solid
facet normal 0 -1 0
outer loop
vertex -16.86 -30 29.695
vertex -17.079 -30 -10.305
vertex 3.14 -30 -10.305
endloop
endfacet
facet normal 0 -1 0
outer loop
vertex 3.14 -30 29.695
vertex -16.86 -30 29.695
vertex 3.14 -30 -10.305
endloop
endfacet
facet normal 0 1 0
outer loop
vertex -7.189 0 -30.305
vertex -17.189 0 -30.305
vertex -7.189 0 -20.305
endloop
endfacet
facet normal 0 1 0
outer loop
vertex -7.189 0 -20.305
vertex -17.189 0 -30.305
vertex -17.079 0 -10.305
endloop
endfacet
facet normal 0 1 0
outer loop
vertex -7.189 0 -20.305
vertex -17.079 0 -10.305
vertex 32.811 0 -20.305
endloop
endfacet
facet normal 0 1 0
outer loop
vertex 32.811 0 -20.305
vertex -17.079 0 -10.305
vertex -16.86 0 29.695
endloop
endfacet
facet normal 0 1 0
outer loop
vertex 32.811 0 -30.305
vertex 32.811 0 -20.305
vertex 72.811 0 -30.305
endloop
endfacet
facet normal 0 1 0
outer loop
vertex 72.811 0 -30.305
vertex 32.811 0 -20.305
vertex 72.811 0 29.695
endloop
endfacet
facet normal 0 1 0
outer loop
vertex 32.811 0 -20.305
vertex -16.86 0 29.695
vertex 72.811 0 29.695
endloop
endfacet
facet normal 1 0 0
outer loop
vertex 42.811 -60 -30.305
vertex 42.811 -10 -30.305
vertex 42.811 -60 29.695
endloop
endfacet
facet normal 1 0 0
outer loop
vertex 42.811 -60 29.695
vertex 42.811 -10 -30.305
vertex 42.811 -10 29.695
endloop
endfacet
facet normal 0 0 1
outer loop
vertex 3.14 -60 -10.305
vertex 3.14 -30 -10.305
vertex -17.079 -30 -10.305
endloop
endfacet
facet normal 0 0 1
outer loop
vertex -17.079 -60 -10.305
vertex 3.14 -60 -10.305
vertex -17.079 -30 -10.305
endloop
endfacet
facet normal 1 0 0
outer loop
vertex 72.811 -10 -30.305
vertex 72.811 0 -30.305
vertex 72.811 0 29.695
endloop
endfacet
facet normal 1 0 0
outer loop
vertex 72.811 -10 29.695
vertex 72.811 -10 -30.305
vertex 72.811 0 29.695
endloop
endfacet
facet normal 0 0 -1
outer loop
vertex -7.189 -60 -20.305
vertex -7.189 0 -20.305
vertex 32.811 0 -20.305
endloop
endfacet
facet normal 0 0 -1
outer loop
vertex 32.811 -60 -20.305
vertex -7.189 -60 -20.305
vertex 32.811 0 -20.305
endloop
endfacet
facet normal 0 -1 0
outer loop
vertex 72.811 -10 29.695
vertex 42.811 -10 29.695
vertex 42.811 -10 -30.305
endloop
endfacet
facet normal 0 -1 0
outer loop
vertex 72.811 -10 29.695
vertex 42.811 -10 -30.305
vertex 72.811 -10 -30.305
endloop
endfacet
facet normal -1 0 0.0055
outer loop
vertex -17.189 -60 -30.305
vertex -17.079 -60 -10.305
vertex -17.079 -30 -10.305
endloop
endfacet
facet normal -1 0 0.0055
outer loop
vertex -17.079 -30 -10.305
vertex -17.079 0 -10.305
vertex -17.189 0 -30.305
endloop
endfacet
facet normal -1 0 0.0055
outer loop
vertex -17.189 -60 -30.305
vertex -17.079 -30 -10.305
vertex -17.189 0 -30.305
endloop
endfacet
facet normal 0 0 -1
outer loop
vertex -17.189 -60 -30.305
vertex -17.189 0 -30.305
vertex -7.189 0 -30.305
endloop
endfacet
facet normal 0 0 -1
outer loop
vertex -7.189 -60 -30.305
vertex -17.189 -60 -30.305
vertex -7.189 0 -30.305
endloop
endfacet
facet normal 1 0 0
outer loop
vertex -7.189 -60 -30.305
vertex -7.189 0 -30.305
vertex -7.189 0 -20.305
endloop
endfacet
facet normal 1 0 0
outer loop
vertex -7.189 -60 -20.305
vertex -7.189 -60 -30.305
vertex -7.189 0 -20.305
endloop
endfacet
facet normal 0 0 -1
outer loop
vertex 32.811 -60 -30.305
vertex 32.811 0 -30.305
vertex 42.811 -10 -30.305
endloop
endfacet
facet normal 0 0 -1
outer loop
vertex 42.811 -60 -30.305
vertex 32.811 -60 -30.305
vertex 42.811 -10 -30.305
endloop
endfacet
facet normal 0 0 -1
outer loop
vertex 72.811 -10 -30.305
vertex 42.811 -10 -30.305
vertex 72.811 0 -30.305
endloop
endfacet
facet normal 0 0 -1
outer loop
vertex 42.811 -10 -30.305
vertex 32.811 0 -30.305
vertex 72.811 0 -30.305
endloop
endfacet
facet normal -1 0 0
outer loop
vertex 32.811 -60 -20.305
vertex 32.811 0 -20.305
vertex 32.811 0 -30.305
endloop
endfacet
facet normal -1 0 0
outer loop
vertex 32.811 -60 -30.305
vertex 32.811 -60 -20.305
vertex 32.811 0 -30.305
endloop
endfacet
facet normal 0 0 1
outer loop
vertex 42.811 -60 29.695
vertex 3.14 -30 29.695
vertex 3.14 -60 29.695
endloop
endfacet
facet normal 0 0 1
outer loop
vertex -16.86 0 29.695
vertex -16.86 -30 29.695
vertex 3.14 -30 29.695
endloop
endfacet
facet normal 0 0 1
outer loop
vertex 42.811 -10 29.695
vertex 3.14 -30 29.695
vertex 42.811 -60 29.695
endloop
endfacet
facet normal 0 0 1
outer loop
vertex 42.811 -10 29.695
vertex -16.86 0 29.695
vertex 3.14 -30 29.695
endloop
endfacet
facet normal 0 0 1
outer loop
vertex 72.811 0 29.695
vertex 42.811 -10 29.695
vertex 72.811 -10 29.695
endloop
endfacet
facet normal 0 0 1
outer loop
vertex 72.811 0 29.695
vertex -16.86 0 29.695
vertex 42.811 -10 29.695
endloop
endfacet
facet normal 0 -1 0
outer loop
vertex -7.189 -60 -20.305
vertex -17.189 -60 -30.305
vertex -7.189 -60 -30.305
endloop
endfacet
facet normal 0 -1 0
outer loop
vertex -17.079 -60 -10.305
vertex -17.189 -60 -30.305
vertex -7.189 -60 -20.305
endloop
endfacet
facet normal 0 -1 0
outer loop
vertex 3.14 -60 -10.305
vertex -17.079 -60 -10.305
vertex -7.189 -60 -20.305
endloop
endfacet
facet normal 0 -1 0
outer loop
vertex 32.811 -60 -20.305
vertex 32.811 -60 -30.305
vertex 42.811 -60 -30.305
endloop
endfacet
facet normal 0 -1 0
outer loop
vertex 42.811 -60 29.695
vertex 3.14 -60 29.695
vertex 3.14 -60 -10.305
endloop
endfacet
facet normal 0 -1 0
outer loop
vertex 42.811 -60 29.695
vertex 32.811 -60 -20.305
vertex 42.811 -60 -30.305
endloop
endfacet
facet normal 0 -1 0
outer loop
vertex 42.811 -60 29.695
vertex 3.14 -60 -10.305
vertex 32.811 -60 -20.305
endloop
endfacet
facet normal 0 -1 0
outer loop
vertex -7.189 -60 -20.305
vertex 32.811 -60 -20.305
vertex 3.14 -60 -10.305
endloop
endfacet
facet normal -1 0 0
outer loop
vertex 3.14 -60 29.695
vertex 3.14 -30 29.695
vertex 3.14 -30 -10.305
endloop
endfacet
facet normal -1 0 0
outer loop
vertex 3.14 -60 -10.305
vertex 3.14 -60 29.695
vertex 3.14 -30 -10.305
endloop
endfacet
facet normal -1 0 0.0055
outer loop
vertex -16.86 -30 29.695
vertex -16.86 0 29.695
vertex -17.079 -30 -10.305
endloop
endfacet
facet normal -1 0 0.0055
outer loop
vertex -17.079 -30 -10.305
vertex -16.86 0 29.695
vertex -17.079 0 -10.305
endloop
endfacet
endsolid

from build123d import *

# Parameters (mm, degrees)
F1_DEPTH = 60
F2_DEPTH = 30
F0_W     = 30
F0_H     = 60
F3_DEPTH = 10


with BuildPart() as f1:
    # F0 (on Front) → F1 (new body)
    with BuildSketch(Plane.XZ):
        Polygon((42.81108, -30.305127), (42.81108, 29.694873), (3.14041, 29.694873), (3.14041, -10.305127), (-17.079143, -10.305127), (-17.18892, -30.305127), (-7.18892, -30.305127), (-7.18892, -20.305127), (32.81108, -20.305127), (32.81108, -30.305127), align=None)
    extrude(amount=F1_DEPTH)

    # F0 (on Front) → F2 (join)
    with BuildSketch(Plane.XZ):
        Polygon((3.14041, -10.305127), (3.14041, 29.694873), (-16.85959, 29.694873), (-17.079143, -10.305127), align=None)
    extrude(amount=F2_DEPTH)

    # F0 (on Front) → F3 (join)
    with BuildSketch(Plane.XZ):
        with Locations((57.81108, -0.305127)):
            Rectangle(F0_W, F0_H)
    extrude(amount=F3_DEPTH)


solid = f1.part
